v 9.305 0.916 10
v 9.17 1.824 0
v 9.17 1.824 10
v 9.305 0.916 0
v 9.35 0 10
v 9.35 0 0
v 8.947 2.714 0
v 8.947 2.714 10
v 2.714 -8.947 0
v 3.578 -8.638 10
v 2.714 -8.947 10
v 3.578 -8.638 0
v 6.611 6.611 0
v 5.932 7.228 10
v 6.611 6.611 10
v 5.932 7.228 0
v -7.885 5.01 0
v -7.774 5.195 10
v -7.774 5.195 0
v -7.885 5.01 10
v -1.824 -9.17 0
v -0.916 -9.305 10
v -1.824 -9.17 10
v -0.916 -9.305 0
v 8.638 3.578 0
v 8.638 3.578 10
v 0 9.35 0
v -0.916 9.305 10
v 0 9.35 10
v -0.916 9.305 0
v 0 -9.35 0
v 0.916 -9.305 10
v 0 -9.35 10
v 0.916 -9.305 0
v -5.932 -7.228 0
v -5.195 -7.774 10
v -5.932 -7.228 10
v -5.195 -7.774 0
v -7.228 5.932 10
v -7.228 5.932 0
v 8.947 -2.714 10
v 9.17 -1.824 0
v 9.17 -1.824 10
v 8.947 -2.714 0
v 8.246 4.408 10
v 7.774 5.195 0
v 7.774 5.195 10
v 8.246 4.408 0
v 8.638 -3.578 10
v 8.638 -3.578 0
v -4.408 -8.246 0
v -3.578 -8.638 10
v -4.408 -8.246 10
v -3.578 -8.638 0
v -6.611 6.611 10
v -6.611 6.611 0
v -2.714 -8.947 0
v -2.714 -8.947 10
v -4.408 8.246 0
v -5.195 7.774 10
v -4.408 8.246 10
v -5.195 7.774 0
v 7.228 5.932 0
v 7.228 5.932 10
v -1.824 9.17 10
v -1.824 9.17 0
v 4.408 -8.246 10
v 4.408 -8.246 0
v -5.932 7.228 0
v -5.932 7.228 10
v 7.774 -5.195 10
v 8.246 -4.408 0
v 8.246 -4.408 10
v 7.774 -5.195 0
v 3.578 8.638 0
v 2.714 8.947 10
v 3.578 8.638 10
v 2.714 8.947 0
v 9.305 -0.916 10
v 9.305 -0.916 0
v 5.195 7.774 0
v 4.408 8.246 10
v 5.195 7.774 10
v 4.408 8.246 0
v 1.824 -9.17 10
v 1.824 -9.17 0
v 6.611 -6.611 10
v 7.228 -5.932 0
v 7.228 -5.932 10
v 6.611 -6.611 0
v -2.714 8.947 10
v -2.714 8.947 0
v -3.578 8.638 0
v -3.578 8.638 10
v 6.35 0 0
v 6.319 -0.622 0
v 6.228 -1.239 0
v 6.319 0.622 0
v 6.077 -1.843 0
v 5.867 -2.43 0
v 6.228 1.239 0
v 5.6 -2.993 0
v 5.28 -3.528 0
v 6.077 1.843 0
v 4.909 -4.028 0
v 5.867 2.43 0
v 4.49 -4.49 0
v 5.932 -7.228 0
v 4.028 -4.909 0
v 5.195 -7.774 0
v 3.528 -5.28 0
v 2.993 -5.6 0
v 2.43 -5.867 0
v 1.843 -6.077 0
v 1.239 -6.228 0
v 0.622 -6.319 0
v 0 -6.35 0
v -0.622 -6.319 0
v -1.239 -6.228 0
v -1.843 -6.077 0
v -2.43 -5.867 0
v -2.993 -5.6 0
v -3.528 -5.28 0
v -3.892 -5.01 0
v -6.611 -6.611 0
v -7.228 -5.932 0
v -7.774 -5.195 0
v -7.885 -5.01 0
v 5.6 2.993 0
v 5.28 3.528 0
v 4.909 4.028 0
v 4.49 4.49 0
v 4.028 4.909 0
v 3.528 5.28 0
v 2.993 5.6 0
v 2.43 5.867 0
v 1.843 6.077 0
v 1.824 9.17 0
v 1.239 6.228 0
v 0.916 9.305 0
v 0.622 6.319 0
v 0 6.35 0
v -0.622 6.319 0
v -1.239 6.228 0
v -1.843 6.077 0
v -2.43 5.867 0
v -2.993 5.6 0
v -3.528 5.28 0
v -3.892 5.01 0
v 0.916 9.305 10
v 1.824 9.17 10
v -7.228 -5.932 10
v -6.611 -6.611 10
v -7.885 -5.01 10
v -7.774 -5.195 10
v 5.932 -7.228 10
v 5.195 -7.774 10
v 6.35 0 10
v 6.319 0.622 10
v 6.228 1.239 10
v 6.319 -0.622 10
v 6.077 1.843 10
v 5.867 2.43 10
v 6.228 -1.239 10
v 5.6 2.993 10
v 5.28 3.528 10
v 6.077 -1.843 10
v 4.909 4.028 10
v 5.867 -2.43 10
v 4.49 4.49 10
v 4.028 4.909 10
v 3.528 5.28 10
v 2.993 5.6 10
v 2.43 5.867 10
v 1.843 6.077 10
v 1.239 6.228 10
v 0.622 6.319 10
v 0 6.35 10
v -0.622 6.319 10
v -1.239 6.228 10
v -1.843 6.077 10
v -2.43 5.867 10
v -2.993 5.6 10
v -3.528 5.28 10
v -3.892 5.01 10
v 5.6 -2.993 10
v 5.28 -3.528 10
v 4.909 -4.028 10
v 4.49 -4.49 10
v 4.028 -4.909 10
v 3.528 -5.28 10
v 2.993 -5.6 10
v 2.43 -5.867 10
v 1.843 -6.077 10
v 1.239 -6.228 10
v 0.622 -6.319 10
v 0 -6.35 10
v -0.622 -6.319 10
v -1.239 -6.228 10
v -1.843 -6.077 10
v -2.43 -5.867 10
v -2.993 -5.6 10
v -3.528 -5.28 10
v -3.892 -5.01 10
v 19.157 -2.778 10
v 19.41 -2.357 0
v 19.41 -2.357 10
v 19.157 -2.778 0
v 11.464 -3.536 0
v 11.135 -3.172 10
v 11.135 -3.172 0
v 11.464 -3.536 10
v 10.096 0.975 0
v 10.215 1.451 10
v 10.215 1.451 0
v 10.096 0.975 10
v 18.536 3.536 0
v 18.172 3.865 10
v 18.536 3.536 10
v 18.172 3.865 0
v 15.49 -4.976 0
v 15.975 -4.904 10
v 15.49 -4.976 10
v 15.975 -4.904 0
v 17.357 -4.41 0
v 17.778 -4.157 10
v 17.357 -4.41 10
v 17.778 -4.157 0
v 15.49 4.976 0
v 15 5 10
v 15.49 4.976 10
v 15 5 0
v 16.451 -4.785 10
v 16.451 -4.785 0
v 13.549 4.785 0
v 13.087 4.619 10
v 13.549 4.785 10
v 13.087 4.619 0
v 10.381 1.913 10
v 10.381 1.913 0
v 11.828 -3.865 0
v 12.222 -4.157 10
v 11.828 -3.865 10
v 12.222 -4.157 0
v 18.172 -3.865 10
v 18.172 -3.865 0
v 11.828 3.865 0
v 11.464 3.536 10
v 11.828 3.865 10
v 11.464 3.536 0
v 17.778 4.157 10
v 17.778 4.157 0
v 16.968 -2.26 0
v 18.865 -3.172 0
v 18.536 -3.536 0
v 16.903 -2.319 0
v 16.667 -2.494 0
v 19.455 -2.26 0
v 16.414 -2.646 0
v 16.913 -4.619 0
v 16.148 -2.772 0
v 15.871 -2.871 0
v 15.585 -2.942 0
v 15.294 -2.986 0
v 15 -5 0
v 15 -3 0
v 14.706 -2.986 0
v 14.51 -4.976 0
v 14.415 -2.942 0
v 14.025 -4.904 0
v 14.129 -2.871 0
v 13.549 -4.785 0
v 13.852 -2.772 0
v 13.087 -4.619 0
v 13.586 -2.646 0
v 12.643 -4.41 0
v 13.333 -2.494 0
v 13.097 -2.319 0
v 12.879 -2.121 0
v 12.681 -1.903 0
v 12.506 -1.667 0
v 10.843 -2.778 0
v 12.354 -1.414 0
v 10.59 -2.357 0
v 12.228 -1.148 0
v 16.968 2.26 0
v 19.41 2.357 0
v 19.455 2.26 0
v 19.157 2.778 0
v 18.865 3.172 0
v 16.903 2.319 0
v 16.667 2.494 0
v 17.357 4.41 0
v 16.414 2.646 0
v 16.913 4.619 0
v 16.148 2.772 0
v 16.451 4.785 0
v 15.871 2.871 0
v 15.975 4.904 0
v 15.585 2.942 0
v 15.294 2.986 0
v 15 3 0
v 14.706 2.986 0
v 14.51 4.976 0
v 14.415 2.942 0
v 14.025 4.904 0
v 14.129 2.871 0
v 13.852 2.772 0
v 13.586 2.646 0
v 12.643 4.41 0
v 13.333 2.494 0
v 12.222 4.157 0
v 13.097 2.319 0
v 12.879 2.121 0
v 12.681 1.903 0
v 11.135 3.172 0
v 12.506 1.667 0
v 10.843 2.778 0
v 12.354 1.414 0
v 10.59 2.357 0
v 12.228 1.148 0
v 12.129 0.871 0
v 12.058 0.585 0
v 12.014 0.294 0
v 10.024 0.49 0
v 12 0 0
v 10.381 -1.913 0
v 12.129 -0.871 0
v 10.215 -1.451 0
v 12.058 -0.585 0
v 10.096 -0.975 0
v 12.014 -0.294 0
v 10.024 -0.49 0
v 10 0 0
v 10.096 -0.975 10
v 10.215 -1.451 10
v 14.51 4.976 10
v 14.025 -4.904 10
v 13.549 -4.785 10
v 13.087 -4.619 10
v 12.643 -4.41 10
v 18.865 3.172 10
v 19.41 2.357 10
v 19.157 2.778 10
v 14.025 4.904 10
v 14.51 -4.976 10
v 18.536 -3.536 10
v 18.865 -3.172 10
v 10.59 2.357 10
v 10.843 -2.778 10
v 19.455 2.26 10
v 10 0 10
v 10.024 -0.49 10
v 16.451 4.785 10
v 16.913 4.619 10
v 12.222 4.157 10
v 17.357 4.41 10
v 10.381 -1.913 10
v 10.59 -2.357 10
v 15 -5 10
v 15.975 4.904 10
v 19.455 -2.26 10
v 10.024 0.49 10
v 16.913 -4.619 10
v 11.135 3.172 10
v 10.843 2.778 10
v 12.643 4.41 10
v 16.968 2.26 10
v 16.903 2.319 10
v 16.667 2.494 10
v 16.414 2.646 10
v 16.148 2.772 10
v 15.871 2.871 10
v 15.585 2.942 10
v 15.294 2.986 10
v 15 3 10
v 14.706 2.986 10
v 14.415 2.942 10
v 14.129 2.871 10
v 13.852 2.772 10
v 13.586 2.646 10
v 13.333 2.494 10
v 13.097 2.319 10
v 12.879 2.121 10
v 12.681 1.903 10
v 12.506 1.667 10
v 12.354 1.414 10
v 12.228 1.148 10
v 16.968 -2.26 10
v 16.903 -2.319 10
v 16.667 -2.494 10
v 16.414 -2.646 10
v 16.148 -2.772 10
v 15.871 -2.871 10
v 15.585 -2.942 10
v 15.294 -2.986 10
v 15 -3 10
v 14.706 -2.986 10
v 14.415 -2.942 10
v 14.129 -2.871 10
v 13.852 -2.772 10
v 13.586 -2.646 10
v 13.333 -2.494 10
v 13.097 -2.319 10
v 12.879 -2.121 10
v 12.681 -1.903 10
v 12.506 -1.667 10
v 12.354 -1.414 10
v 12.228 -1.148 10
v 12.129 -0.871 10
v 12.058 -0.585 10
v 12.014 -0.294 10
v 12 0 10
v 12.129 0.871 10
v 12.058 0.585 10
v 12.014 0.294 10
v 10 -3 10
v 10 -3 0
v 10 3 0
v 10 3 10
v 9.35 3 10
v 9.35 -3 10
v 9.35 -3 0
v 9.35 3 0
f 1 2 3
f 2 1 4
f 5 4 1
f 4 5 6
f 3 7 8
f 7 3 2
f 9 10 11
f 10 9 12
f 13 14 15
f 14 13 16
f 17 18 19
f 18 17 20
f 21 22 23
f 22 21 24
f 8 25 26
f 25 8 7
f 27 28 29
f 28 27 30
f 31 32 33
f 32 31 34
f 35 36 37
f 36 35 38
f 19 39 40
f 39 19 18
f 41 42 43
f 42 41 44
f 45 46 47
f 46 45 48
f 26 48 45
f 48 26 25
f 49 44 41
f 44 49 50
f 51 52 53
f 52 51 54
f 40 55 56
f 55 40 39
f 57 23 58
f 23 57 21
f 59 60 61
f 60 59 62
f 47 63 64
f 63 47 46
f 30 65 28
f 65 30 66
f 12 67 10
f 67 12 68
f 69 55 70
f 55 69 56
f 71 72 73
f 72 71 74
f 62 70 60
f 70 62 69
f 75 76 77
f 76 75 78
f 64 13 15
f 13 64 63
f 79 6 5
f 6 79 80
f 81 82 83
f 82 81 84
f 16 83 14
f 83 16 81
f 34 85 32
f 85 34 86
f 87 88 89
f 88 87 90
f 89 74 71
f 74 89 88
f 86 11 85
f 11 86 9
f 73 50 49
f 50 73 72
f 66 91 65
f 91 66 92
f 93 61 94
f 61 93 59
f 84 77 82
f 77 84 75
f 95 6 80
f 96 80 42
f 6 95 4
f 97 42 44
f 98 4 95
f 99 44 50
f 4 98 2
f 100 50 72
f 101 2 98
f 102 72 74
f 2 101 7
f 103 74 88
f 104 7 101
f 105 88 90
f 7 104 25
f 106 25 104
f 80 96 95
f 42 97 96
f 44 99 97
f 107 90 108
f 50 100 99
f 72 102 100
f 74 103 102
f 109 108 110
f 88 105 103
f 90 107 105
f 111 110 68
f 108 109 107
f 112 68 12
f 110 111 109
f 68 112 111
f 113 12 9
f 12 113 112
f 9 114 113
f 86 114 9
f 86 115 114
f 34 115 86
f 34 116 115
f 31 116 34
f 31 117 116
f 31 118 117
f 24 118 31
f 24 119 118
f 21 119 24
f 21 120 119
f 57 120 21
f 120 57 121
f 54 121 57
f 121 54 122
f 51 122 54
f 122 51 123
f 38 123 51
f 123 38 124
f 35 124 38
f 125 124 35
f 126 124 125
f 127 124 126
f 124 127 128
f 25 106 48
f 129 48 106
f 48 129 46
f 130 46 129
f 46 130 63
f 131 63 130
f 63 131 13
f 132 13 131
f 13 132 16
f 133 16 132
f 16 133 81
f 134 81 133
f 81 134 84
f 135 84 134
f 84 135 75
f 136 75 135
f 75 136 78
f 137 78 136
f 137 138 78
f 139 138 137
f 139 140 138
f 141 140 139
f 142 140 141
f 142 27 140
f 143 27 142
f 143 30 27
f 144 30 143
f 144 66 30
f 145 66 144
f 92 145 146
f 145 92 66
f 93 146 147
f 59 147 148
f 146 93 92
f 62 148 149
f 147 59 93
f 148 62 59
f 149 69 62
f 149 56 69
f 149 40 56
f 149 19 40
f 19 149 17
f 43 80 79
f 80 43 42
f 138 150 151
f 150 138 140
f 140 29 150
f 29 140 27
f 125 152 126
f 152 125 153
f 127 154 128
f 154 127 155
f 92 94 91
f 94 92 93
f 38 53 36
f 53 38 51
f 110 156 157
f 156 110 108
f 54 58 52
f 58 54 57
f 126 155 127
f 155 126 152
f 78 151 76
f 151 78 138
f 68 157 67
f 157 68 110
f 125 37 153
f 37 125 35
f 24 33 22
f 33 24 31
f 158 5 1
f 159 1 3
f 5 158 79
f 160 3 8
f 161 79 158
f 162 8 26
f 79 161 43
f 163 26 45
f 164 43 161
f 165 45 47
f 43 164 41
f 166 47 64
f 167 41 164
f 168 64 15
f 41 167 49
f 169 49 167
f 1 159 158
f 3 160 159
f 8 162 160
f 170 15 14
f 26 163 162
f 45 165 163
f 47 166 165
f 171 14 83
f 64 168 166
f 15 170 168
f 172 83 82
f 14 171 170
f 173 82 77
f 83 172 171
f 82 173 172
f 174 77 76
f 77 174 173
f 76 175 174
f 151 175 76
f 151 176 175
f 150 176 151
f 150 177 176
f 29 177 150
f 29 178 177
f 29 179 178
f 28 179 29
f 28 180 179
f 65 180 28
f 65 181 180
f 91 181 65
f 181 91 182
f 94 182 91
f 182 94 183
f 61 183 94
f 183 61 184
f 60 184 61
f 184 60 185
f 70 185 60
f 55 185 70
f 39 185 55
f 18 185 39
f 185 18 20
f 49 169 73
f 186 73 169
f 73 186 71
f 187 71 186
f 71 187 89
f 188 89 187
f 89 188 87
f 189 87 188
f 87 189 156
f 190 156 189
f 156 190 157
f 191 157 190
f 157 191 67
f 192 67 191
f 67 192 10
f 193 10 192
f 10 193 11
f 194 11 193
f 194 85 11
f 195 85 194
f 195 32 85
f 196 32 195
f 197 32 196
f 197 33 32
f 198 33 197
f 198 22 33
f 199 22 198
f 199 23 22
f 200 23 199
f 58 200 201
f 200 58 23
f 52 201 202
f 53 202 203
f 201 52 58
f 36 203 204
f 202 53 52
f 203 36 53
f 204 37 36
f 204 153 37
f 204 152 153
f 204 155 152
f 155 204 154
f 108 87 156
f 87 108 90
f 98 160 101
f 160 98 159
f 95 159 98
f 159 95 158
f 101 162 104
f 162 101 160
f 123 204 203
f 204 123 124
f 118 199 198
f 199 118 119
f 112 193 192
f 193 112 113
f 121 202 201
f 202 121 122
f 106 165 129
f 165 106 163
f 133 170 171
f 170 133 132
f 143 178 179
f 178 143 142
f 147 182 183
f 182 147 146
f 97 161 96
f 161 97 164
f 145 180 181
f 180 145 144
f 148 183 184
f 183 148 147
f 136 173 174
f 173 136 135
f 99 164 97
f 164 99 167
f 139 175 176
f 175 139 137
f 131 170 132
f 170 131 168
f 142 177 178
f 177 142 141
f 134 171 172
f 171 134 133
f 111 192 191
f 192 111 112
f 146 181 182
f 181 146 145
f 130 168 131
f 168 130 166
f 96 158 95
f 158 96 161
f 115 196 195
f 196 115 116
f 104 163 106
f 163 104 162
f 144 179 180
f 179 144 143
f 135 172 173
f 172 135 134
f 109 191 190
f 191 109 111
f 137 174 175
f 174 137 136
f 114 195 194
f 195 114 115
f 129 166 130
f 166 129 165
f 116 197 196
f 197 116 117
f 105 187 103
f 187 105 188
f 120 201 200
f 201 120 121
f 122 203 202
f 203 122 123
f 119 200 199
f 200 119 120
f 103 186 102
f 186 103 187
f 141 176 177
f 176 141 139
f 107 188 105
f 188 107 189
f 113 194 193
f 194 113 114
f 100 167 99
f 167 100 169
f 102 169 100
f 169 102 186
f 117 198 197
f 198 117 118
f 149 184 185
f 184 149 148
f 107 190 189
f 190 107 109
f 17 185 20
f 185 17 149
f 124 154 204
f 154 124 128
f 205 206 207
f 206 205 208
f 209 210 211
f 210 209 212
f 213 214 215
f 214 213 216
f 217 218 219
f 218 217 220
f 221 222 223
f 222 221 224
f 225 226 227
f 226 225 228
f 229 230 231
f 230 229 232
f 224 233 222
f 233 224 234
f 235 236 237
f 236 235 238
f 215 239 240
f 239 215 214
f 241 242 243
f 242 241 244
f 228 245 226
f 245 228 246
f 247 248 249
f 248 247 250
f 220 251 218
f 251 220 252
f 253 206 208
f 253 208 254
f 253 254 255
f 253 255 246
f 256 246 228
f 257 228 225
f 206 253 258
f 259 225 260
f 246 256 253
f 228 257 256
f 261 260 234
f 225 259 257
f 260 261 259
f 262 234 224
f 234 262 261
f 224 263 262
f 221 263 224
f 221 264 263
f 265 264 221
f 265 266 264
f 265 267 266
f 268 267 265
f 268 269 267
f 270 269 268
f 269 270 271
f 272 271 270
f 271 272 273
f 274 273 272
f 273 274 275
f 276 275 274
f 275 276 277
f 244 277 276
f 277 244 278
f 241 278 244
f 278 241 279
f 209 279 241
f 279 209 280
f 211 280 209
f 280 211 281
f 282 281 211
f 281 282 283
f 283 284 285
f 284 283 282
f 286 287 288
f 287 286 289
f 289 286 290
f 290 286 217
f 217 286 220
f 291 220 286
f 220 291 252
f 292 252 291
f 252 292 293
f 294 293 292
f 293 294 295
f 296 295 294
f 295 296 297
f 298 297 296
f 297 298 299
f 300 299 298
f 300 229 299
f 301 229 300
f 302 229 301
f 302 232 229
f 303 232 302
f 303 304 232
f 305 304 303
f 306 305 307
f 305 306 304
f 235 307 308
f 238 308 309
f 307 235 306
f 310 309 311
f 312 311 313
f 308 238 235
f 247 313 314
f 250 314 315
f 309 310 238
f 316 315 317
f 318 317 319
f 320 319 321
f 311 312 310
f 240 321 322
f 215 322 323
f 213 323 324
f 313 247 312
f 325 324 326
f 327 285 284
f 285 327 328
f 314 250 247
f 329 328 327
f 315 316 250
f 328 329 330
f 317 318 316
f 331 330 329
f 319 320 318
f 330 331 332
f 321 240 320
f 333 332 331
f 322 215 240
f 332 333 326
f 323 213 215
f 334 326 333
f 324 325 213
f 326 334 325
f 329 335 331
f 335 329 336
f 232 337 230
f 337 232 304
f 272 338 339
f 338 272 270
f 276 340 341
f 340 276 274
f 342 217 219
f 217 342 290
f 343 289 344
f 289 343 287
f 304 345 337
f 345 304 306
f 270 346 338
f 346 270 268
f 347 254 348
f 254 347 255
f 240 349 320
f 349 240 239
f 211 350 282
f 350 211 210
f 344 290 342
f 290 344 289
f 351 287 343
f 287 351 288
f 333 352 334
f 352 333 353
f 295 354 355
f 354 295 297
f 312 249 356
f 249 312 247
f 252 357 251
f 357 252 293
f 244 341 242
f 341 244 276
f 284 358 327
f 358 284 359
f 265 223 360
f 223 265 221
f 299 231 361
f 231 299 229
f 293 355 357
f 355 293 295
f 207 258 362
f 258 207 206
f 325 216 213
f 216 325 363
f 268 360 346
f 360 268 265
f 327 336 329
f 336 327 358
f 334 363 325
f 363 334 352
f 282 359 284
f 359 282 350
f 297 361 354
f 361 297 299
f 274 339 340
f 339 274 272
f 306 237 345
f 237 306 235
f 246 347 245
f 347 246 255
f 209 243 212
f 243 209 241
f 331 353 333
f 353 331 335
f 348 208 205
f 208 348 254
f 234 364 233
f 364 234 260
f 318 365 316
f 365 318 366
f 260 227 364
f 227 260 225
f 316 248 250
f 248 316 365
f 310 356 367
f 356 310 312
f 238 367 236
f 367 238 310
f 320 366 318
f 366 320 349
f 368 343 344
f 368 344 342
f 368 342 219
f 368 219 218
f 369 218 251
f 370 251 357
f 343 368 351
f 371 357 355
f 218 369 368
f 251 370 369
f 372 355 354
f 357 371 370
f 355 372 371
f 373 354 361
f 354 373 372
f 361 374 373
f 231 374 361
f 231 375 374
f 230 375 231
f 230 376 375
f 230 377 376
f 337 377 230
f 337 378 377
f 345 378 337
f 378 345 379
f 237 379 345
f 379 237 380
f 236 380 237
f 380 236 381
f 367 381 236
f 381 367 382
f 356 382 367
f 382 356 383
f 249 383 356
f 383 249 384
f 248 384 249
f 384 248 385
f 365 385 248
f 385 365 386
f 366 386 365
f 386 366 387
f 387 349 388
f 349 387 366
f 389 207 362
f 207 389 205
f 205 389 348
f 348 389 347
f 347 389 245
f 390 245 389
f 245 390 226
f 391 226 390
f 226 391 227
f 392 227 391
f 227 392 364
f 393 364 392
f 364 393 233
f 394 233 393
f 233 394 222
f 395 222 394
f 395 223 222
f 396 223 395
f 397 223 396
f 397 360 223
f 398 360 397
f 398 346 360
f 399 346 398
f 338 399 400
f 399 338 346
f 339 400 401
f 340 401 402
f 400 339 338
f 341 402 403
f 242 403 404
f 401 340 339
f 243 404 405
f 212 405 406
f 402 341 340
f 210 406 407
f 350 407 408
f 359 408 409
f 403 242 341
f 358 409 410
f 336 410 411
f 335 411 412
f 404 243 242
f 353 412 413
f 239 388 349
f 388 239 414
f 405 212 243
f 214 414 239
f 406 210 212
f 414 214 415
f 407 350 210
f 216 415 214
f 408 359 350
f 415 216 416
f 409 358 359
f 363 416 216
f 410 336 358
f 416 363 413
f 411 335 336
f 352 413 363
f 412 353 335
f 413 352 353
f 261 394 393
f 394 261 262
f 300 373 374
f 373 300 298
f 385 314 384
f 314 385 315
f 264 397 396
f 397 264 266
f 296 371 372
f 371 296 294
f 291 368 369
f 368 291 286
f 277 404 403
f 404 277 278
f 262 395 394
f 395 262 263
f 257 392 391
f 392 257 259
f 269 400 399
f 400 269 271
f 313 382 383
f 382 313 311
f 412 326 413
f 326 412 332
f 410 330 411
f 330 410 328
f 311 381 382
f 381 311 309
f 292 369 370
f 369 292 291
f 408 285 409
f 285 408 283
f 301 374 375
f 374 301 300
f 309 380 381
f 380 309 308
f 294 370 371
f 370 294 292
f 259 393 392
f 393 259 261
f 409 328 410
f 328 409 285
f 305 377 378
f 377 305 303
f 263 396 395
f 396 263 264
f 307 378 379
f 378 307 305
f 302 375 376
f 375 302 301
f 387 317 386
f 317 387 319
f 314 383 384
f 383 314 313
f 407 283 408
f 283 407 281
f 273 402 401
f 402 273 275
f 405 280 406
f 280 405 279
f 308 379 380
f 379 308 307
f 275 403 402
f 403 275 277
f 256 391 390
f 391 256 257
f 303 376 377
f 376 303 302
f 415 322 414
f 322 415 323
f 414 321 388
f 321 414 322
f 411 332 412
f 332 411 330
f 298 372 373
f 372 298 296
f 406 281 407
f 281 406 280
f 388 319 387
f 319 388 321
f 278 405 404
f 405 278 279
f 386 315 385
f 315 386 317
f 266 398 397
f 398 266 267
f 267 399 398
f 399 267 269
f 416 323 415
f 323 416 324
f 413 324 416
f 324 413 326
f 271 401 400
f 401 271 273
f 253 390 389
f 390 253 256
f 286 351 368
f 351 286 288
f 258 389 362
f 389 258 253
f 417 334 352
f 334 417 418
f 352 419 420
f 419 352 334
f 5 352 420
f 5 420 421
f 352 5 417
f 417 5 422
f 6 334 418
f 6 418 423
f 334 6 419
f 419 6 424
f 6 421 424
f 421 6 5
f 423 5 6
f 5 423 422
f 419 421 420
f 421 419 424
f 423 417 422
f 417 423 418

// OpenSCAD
$fn = 64;

// Dimensions
rod_id = 12.7;        // inner diameter of rod ring (mm)
rod_wall = 3;         // wall thickness of rod ring (mm)
rod_od = rod_id + 2 * rod_wall;  // outer diameter of rod ring (mm)
rod_ring_height = 10; // height of the entire part (Z)

tubing_id = 6;        // inner diameter of tubing ring (mm)
tubing_wall = 2;      // wall thickness of tubing ring (mm)
tubing_od = tubing_id + 2 * tubing_wall; // outer diameter of tubing ring (mm)

bridge_width = 6;     // width in Y-direction of the bridge (mm)
bridge_x_start = 8;   // start x-coordinate of bridge
bridge_x_end = 12;    // end x-coordinate of bridge

// Opening cut dimensions
rod_opening_width = 10;   // width of rod ring opening (mm)
tubing_opening_width = 4.5; // width of tubing ring opening (mm)

// Calculate y-limits for cuts
rod_cut_y = rod_opening_width / 2;
tubing_cut_y = tubing_opening_width / 2;

// Rod ring (outer circle minus inner circle) at z=0 to z=10
module rod_ring_with_cut() {
    difference() {
        // Outer circle at z=0 to z=10
        translate([0, 0, 0])
            cylinder(h = rod_ring_height, r = rod_od / 2);
        // Inner circle (hole)
        translate([0, 0, -0.01])
            cylinder(h = rod_ring_height + 0.02, r = rod_id / 2);
        // Opening cut: remove x < 0 and -5 < y < 5
        translate([-rod_od, -rod_cut_y - 0.01, -0.01])
            cube([rod_od + 1, rod_opening_width + 0.02, rod_ring_height + 0.02]);
    }
}

module tubing_ring_with_cut() {
    // Position tubing ring at x = 15, y = 0, z=0 to z=10
    translate([15, 0, 0]) {
        difference() {
            // Outer circle at z=0 to z=10
            cylinder(h = rod_ring_height, r = tubing_od / 2);
            // Inner circle (hole)
            translate([0, 0, -0.01])
                cylinder(h = rod_ring_height + 0.02, r = tubing_id / 2);
            // Opening cut: remove x > 15 and -2.25 < y < 2.25
            // Since we're at x=15, we need to cut from x=15 to x=15+something
            translate([0.01, -tubing_cut_y - 0.01, -0.01])
                cube([tubing_od + 1, tubing_opening_width + 0.02, rod_ring_height + 0.02]);
        }
    }
}

module bridge() {
    // Bridge between rod ring and tubing ring
    // y-range: -bridge_width/2 to +bridge_width/2
    // x-range: from rod ring outer edge (rod_od/2) to tubing ring inner edge (15 - tubing_od/2)
    // but constrained to [bridge_x_start, bridge_x_end]
    x_start = max(bridge_x_start, rod_od / 2);
    x_end = min(bridge_x_end, 15 - tubing_od / 2);
    
    if (x_start < x_end) {
        translate([x_start, -bridge_width/2, 0])
            cube([x_end - x_start, bridge_width, rod_ring_height]);
    }
}

// Assemble the part
rod_ring_with_cut();
tubing_ring_with_cut();
bridge();
